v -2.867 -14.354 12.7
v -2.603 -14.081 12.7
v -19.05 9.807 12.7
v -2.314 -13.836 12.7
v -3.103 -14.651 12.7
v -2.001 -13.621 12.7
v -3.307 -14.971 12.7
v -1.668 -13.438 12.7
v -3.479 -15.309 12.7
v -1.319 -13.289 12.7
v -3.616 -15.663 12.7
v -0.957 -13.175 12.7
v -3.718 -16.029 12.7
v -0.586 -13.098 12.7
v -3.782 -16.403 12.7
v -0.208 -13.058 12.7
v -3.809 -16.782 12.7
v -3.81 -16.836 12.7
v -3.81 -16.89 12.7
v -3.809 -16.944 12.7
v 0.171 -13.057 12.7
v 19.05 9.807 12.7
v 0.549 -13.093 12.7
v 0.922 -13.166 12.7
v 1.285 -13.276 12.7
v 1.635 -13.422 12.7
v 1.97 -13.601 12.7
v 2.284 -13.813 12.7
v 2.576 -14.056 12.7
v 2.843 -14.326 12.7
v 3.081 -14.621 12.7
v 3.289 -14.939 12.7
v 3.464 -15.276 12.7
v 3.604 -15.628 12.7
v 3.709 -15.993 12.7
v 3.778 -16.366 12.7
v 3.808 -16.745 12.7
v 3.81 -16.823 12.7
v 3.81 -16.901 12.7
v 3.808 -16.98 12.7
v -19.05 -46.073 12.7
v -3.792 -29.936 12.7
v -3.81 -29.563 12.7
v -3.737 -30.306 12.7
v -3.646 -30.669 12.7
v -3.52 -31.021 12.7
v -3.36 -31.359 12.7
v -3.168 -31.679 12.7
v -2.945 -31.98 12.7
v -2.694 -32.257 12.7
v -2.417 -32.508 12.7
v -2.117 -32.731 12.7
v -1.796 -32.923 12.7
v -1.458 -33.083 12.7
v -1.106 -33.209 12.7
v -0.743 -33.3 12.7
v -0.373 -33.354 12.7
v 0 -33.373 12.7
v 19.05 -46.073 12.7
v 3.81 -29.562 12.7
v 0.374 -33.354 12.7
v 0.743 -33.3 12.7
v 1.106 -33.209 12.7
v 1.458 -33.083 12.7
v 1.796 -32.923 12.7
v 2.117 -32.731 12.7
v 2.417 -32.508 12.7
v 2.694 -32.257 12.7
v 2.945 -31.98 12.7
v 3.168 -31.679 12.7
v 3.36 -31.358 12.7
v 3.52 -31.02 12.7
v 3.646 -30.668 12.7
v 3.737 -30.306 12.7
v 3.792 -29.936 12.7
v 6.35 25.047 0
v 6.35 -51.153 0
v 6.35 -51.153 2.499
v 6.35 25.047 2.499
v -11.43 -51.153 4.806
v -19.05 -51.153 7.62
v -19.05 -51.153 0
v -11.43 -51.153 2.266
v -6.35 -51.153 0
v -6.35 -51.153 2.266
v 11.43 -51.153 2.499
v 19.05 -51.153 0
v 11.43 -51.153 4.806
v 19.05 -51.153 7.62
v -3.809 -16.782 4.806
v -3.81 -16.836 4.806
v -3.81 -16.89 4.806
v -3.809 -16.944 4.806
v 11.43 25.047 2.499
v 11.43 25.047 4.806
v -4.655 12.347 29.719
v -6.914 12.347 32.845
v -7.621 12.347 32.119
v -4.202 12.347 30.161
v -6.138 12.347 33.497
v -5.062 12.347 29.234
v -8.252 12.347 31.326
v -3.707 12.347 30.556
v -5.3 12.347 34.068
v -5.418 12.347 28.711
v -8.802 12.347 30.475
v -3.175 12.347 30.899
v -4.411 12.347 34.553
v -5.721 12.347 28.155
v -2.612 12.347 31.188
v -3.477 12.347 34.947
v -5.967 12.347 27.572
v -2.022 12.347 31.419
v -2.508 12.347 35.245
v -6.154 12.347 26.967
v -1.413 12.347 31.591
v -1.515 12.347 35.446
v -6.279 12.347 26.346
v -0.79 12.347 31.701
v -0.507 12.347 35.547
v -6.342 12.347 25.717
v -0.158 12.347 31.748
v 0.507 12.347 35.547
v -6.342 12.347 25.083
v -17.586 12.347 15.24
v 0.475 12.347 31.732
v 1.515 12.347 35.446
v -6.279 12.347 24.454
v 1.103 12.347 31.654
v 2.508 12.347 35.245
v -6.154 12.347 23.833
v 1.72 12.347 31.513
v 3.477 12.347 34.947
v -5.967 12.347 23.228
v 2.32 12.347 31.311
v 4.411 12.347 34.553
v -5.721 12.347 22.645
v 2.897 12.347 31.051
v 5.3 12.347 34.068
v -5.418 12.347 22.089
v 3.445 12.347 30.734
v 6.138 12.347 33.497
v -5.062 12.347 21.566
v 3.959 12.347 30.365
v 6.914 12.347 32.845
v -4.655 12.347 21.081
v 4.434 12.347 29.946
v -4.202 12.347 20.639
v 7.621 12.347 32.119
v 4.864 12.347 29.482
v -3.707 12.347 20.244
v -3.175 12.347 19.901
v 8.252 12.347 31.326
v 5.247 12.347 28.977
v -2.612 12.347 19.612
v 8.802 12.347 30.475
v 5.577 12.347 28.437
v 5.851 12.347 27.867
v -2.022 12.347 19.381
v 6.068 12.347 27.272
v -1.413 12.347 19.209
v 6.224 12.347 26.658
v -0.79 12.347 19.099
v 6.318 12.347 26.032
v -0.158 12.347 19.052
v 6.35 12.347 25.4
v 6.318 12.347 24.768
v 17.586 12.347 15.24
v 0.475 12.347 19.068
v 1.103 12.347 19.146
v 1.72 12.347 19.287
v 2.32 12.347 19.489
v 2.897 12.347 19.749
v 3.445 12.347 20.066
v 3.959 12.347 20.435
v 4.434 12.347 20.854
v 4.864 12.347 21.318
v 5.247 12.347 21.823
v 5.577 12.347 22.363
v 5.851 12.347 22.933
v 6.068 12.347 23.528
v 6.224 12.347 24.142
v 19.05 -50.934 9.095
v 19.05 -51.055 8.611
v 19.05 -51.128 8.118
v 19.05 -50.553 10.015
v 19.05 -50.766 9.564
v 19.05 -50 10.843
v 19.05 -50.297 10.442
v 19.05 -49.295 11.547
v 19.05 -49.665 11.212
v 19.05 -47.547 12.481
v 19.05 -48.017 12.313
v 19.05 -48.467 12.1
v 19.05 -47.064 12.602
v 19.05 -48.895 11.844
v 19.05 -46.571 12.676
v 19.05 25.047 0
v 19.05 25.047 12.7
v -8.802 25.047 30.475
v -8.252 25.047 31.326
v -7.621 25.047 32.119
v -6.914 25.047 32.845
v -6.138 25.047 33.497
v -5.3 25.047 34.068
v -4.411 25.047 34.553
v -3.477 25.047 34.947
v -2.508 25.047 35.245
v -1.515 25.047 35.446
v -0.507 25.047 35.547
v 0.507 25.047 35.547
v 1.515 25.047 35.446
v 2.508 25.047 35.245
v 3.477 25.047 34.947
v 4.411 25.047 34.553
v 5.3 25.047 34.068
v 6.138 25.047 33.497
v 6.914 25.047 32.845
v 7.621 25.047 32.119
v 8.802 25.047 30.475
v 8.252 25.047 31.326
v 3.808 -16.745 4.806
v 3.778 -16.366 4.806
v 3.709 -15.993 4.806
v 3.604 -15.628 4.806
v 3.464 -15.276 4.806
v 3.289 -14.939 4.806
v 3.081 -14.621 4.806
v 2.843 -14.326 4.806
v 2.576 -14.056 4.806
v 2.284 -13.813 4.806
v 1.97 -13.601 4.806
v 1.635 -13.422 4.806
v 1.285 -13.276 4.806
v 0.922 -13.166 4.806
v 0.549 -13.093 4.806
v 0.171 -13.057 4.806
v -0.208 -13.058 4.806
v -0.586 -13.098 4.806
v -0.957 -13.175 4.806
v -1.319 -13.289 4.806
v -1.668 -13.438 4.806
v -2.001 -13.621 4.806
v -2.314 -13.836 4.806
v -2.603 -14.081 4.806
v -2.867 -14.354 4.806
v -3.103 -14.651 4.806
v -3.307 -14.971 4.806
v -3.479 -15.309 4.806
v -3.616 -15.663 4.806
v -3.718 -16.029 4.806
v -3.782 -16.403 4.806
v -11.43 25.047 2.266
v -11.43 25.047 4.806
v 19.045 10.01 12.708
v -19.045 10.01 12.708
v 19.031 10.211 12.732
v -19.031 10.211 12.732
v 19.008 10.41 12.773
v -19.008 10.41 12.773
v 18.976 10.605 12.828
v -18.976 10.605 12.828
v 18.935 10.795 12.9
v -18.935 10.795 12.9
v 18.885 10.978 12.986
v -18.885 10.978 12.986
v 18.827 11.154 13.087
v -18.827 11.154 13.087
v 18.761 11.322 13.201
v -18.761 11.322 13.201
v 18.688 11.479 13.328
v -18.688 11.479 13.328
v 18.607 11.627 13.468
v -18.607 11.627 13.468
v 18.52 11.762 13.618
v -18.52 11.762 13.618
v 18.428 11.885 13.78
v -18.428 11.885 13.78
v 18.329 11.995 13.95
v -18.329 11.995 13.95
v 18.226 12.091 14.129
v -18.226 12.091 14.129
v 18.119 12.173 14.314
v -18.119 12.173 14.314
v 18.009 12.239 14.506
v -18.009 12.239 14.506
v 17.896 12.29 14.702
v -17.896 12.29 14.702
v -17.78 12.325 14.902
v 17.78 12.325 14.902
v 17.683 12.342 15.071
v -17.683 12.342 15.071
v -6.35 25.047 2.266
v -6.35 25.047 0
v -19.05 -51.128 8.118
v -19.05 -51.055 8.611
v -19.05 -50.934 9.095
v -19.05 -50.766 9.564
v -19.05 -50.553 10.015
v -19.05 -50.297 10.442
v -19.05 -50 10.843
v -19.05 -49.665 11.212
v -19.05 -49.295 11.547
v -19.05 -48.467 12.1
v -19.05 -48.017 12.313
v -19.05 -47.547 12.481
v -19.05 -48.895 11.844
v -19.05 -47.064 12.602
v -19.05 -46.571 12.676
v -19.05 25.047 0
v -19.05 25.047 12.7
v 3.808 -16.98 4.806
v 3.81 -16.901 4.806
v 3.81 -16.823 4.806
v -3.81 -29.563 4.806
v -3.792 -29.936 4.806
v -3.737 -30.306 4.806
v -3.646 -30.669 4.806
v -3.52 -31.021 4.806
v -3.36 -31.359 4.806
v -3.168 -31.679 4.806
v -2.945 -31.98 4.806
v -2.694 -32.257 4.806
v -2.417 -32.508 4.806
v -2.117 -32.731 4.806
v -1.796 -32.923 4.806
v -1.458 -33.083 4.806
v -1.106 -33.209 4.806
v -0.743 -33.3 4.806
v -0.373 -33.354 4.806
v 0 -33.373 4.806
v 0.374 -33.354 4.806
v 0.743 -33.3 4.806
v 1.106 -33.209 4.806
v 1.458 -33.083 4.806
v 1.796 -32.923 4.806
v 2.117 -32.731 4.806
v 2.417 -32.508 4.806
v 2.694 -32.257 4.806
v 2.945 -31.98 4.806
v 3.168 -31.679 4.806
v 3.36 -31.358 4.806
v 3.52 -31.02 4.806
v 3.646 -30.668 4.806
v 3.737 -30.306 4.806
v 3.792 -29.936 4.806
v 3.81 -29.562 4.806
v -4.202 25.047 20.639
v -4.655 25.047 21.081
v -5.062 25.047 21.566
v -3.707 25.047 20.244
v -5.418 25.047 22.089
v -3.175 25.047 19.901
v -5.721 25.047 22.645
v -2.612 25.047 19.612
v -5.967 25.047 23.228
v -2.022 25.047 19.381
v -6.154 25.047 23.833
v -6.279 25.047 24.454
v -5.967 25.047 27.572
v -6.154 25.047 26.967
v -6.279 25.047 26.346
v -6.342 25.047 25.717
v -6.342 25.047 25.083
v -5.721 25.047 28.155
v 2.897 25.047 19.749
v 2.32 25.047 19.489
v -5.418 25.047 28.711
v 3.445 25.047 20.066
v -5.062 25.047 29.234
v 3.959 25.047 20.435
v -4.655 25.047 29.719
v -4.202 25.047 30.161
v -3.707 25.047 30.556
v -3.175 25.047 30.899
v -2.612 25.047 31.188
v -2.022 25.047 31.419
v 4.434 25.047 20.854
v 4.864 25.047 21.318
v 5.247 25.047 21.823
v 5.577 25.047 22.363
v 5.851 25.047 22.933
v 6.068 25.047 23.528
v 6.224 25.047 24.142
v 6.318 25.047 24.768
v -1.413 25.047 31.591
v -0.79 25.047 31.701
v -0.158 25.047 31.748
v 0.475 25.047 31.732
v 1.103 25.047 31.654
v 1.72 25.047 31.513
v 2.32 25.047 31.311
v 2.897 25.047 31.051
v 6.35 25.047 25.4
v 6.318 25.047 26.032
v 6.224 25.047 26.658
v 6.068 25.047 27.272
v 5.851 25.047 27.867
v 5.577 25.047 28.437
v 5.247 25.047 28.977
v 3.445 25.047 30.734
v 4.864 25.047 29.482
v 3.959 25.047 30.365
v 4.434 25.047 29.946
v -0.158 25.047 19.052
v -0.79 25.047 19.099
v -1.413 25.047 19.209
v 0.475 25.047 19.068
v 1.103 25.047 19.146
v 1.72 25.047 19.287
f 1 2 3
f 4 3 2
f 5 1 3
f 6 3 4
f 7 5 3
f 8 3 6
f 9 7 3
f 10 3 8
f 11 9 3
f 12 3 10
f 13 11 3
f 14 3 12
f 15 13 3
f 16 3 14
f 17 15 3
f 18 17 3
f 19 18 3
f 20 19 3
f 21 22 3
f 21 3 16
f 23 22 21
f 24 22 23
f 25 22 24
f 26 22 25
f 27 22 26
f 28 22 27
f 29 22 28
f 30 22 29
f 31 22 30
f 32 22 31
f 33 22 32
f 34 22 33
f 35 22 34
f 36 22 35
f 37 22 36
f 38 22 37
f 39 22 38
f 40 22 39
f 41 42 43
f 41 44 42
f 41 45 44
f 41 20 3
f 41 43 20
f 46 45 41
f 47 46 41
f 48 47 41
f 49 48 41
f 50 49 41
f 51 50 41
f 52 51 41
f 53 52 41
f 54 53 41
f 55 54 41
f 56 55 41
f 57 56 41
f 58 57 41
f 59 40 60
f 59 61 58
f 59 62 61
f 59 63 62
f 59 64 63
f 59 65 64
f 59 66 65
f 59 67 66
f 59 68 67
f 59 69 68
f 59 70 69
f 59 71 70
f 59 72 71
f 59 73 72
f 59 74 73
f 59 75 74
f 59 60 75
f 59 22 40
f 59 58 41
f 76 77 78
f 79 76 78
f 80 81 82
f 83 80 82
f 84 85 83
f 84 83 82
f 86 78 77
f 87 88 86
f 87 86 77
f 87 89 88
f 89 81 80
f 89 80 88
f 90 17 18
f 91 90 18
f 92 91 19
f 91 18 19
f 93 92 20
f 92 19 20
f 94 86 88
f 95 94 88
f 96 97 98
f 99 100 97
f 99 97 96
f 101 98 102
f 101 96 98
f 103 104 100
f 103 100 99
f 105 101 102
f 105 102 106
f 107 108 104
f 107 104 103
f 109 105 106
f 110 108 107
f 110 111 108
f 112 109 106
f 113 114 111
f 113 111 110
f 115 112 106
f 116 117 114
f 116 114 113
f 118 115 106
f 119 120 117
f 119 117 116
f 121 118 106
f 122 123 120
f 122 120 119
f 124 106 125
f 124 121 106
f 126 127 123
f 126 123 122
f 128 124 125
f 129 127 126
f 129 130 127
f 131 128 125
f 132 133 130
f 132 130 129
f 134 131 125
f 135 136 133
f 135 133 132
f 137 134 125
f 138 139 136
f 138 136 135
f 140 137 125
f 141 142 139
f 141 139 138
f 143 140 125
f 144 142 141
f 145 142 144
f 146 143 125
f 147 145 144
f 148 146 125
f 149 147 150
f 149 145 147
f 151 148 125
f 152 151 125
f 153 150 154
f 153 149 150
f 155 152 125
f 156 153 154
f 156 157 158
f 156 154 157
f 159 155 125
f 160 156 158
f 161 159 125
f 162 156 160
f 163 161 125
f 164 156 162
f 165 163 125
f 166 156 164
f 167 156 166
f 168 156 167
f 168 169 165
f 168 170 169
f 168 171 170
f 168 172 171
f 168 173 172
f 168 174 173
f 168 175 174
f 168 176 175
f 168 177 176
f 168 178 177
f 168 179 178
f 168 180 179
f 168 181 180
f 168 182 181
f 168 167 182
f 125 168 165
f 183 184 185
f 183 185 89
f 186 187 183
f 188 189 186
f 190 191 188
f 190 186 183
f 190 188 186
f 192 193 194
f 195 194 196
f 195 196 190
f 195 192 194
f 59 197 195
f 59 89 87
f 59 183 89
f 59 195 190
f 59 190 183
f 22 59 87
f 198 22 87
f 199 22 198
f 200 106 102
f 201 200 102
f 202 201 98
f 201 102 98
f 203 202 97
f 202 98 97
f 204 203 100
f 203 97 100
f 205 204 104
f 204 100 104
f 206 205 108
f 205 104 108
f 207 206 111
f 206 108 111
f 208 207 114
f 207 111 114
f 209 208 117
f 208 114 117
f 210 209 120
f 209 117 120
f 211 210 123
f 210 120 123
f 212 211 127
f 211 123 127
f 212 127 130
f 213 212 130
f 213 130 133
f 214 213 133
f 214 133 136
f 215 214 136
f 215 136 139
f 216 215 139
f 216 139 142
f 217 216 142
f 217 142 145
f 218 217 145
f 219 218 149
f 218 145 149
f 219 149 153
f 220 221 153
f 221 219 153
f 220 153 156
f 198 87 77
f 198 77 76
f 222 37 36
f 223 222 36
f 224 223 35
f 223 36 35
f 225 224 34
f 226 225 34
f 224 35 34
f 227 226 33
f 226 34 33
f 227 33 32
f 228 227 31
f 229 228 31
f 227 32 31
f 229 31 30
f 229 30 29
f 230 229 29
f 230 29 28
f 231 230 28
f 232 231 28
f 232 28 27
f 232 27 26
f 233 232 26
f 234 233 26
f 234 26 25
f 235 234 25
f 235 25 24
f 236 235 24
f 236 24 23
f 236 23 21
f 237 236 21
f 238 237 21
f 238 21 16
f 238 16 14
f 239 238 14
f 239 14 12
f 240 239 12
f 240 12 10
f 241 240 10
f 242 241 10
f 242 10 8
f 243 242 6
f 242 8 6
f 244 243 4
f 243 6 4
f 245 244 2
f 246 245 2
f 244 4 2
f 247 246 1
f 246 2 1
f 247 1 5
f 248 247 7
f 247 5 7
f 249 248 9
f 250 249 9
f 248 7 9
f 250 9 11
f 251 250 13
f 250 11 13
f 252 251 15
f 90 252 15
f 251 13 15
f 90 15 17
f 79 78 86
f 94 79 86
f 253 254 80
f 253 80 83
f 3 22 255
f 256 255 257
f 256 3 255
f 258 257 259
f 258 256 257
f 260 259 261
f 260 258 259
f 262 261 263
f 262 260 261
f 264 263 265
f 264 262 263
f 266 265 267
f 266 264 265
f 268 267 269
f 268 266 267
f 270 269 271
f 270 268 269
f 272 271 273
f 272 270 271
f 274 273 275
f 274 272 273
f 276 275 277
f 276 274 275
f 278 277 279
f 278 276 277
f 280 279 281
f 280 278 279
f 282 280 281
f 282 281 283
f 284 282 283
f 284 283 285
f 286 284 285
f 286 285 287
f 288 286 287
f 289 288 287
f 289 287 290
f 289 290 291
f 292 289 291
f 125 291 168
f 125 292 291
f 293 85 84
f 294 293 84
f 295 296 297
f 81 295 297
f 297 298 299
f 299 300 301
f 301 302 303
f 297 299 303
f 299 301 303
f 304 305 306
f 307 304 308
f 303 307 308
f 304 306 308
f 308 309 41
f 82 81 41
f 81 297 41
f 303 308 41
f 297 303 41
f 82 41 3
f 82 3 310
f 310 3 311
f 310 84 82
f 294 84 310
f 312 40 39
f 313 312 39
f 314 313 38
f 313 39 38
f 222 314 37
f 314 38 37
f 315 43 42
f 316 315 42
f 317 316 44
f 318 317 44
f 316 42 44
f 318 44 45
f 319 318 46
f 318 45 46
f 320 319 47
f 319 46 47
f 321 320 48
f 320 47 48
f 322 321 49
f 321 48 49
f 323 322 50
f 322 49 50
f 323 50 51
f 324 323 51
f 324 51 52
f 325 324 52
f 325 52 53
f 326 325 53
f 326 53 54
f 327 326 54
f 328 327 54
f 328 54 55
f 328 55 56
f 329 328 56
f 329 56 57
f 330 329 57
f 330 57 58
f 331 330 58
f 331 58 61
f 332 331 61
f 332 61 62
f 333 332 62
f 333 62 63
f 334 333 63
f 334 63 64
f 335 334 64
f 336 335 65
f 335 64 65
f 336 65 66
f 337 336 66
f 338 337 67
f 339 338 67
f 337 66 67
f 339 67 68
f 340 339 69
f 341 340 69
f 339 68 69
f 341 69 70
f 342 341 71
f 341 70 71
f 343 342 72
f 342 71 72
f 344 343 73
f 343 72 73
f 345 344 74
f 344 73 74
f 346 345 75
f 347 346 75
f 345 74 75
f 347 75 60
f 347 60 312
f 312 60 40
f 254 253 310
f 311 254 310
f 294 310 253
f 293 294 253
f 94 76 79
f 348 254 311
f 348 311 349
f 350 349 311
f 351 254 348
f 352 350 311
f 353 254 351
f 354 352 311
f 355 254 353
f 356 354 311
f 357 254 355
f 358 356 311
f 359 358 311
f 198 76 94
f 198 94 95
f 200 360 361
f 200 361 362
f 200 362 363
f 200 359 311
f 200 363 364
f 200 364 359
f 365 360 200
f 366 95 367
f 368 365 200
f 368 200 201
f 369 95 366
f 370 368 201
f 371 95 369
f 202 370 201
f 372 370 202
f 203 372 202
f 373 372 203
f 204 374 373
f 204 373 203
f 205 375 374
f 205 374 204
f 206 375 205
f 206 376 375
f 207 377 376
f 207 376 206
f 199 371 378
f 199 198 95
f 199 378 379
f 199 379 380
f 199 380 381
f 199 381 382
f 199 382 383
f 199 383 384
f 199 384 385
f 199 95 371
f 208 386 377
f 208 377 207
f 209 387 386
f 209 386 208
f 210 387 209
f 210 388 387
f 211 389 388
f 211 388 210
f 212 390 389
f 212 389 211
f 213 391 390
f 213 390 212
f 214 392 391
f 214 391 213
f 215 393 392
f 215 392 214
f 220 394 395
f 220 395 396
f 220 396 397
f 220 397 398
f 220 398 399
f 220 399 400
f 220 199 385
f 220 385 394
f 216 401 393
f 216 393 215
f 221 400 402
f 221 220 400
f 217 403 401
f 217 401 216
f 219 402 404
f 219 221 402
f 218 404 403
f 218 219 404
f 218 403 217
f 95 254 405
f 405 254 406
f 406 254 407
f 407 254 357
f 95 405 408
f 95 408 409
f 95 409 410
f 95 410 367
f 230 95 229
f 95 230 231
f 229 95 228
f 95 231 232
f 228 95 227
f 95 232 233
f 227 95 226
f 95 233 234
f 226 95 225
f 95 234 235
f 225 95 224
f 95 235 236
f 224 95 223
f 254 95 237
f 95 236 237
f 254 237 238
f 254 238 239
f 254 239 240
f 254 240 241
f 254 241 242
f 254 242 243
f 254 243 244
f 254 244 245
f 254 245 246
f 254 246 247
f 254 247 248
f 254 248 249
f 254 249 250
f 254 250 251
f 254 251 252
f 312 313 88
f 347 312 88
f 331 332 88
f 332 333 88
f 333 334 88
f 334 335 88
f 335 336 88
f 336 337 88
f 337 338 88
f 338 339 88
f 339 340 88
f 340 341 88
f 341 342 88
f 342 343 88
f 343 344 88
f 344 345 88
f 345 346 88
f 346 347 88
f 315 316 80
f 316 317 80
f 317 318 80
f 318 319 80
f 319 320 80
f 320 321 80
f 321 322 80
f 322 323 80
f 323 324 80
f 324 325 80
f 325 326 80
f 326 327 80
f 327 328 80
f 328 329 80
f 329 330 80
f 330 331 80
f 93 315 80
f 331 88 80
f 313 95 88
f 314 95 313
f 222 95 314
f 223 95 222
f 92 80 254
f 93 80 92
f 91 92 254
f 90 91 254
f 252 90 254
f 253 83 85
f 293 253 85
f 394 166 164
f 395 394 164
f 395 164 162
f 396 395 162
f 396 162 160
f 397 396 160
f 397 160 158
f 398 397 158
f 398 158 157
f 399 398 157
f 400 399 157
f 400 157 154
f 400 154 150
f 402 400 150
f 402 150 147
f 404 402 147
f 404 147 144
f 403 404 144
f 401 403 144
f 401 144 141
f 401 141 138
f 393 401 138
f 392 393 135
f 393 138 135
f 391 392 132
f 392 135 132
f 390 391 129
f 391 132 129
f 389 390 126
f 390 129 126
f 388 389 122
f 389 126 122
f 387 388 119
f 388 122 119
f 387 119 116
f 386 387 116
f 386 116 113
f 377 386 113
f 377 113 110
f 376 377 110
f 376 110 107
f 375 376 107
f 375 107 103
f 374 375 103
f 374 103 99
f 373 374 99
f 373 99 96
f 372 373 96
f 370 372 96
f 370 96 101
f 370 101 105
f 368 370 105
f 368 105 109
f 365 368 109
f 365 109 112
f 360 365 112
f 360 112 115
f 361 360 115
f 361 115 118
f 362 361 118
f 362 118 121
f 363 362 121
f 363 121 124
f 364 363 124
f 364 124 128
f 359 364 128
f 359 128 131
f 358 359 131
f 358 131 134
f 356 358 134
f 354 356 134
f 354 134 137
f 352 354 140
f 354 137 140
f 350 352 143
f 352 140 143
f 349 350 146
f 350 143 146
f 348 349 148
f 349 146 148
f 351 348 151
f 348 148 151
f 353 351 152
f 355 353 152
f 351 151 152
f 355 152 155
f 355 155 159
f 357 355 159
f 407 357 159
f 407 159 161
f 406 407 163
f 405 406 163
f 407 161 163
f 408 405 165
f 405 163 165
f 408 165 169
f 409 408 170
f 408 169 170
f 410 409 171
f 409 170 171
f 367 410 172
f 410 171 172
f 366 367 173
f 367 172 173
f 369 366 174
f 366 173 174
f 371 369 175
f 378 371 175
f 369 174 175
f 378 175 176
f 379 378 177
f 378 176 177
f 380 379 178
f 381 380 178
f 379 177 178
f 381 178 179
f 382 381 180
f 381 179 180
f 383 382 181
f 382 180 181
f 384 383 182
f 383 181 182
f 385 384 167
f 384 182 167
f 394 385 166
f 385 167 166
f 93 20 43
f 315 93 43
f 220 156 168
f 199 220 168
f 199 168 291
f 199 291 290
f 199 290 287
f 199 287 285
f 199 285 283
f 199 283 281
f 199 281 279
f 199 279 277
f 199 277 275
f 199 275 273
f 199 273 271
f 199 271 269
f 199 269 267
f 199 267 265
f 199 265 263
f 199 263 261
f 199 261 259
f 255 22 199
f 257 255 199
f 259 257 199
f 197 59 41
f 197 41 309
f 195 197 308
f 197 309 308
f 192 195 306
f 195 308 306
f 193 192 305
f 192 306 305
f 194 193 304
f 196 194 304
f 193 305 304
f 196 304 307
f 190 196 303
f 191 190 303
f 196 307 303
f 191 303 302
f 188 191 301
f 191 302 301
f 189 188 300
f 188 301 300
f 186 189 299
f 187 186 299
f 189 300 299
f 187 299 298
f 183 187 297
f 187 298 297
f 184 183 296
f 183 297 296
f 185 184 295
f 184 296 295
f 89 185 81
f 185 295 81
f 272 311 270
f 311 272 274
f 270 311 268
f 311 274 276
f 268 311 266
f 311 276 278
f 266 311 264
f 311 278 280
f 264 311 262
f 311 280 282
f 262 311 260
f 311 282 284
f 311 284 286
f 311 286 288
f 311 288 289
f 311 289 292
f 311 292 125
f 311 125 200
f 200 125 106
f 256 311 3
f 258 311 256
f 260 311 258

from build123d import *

# Parameters (mm, degrees)
F1_DEPTH  = 19.05
F3_DEPTH  = 12.701
F4_R      = 6.35
F5_DEPTH  = 12.701
F6_R      = 2.54
F8_DEPTH  = 76.201
F9_R      = 5.08
F11_DEPTH = 25.4


with BuildPart() as f1:
    # F0 (on Right) → F1 (new body, symmetric)
    with BuildSketch(Plane.YZ):
        Polygon((-51.152777, 0), (0, 0), (25.047223, 0), (25.047223, 38.1), (12.347223, 38.1), (12.347223, 12.7), (-51.152777, 12.7), align=None)
    extrude(amount=F1_DEPTH, both=True)

    # F2 (on face) → F3 (cut, through all)
    with BuildSketch(Plane.XZ.offset(-12.347223)):
        with BuildLine():
            ThreePointArc((-8.801841, 30.474761), (0, 35.56), (8.801841, 30.474761))
            Line((8.801841, 30.474761), (19.05, 12.7))
            Line((19.05, 12.7), (19.05, 38.1))
            Line((19.05, 38.1), (-19.05, 38.1))
            Line((-19.05, 38.1), (-19.05, 12.7))
            Line((-19.05, 12.7), (-8.801841, 30.474761))
        make_face()
    extrude(amount=-F3_DEPTH, mode=Mode.SUBTRACT)

    # F4 (on face) → F5 (cut, through all)
    with BuildSketch(Plane.XZ.offset(-12.347223)):
        with Locations((0, 25.4)):
            Circle(F4_R)
    extrude(amount=-F5_DEPTH, mode=Mode.SUBTRACT)

    # F6
    f6_edges = [f1.edges().sort_by_distance(p)[0] for p in [
        (0, 12.347223, 12.7),
    ]]
    fillet(f6_edges, radius=F6_R)

    # F7 (on face) → F8 (cut, through all)
    with BuildSketch(Plane.XZ.offset(51.152777)):
        Polygon((-6.35, 0), (0, 0), (6.35, 0), (6.35, 2.49879), (11.43, 2.49879), (11.43, 4.806255), (-11.43, 4.806255), (-11.43, 2.266255), (-6.35, 2.266255), align=None)
    extrude(amount=-F8_DEPTH, mode=Mode.SUBTRACT)

    # F9
    f9_edges = [f1.edges().sort_by_distance(p)[0] for p in [
        (0, -51.152777, 12.7),
    ]]
    fillet(f9_edges, radius=F9_R)

    # F10 (on face) → F11 (cut)
    with BuildSketch(Plane.XY.offset(12.7)):
        with BuildLine():
            Line((3.80817, -16.744703), (3.808204, -16.979764))
            ThreePointArc((3.808204, -16.979764), (3.81, -16.862233), (3.80817, -16.744703))
        make_face()
        with BuildLine():
            Line((3.81, -29.562233), (3.808204, -16.979764))
            Line((3.808204, -16.979764), (3.80817, -16.744703))
            ThreePointArc((3.80817, -16.744703), (-0.018418, -13.052821), (-3.809134, -16.781525))
            Line((-3.809134, -16.781525), (-3.809144, -16.943512))
            Line((-3.809144, -16.943512), (-3.81, -29.562519))
            ThreePointArc((-3.81, -29.562519), (0.000143, -33.372777), (3.81, -29.562233))
        make_face()
        with BuildLine():
            Line((-3.809144, -16.943512), (-3.809134, -16.781525))
            ThreePointArc((-3.809134, -16.781525), (-3.81, -16.862519), (-3.809144, -16.943512))
        make_face()
    extrude(amount=-F11_DEPTH, mode=Mode.SUBTRACT)


solid = f1.part
